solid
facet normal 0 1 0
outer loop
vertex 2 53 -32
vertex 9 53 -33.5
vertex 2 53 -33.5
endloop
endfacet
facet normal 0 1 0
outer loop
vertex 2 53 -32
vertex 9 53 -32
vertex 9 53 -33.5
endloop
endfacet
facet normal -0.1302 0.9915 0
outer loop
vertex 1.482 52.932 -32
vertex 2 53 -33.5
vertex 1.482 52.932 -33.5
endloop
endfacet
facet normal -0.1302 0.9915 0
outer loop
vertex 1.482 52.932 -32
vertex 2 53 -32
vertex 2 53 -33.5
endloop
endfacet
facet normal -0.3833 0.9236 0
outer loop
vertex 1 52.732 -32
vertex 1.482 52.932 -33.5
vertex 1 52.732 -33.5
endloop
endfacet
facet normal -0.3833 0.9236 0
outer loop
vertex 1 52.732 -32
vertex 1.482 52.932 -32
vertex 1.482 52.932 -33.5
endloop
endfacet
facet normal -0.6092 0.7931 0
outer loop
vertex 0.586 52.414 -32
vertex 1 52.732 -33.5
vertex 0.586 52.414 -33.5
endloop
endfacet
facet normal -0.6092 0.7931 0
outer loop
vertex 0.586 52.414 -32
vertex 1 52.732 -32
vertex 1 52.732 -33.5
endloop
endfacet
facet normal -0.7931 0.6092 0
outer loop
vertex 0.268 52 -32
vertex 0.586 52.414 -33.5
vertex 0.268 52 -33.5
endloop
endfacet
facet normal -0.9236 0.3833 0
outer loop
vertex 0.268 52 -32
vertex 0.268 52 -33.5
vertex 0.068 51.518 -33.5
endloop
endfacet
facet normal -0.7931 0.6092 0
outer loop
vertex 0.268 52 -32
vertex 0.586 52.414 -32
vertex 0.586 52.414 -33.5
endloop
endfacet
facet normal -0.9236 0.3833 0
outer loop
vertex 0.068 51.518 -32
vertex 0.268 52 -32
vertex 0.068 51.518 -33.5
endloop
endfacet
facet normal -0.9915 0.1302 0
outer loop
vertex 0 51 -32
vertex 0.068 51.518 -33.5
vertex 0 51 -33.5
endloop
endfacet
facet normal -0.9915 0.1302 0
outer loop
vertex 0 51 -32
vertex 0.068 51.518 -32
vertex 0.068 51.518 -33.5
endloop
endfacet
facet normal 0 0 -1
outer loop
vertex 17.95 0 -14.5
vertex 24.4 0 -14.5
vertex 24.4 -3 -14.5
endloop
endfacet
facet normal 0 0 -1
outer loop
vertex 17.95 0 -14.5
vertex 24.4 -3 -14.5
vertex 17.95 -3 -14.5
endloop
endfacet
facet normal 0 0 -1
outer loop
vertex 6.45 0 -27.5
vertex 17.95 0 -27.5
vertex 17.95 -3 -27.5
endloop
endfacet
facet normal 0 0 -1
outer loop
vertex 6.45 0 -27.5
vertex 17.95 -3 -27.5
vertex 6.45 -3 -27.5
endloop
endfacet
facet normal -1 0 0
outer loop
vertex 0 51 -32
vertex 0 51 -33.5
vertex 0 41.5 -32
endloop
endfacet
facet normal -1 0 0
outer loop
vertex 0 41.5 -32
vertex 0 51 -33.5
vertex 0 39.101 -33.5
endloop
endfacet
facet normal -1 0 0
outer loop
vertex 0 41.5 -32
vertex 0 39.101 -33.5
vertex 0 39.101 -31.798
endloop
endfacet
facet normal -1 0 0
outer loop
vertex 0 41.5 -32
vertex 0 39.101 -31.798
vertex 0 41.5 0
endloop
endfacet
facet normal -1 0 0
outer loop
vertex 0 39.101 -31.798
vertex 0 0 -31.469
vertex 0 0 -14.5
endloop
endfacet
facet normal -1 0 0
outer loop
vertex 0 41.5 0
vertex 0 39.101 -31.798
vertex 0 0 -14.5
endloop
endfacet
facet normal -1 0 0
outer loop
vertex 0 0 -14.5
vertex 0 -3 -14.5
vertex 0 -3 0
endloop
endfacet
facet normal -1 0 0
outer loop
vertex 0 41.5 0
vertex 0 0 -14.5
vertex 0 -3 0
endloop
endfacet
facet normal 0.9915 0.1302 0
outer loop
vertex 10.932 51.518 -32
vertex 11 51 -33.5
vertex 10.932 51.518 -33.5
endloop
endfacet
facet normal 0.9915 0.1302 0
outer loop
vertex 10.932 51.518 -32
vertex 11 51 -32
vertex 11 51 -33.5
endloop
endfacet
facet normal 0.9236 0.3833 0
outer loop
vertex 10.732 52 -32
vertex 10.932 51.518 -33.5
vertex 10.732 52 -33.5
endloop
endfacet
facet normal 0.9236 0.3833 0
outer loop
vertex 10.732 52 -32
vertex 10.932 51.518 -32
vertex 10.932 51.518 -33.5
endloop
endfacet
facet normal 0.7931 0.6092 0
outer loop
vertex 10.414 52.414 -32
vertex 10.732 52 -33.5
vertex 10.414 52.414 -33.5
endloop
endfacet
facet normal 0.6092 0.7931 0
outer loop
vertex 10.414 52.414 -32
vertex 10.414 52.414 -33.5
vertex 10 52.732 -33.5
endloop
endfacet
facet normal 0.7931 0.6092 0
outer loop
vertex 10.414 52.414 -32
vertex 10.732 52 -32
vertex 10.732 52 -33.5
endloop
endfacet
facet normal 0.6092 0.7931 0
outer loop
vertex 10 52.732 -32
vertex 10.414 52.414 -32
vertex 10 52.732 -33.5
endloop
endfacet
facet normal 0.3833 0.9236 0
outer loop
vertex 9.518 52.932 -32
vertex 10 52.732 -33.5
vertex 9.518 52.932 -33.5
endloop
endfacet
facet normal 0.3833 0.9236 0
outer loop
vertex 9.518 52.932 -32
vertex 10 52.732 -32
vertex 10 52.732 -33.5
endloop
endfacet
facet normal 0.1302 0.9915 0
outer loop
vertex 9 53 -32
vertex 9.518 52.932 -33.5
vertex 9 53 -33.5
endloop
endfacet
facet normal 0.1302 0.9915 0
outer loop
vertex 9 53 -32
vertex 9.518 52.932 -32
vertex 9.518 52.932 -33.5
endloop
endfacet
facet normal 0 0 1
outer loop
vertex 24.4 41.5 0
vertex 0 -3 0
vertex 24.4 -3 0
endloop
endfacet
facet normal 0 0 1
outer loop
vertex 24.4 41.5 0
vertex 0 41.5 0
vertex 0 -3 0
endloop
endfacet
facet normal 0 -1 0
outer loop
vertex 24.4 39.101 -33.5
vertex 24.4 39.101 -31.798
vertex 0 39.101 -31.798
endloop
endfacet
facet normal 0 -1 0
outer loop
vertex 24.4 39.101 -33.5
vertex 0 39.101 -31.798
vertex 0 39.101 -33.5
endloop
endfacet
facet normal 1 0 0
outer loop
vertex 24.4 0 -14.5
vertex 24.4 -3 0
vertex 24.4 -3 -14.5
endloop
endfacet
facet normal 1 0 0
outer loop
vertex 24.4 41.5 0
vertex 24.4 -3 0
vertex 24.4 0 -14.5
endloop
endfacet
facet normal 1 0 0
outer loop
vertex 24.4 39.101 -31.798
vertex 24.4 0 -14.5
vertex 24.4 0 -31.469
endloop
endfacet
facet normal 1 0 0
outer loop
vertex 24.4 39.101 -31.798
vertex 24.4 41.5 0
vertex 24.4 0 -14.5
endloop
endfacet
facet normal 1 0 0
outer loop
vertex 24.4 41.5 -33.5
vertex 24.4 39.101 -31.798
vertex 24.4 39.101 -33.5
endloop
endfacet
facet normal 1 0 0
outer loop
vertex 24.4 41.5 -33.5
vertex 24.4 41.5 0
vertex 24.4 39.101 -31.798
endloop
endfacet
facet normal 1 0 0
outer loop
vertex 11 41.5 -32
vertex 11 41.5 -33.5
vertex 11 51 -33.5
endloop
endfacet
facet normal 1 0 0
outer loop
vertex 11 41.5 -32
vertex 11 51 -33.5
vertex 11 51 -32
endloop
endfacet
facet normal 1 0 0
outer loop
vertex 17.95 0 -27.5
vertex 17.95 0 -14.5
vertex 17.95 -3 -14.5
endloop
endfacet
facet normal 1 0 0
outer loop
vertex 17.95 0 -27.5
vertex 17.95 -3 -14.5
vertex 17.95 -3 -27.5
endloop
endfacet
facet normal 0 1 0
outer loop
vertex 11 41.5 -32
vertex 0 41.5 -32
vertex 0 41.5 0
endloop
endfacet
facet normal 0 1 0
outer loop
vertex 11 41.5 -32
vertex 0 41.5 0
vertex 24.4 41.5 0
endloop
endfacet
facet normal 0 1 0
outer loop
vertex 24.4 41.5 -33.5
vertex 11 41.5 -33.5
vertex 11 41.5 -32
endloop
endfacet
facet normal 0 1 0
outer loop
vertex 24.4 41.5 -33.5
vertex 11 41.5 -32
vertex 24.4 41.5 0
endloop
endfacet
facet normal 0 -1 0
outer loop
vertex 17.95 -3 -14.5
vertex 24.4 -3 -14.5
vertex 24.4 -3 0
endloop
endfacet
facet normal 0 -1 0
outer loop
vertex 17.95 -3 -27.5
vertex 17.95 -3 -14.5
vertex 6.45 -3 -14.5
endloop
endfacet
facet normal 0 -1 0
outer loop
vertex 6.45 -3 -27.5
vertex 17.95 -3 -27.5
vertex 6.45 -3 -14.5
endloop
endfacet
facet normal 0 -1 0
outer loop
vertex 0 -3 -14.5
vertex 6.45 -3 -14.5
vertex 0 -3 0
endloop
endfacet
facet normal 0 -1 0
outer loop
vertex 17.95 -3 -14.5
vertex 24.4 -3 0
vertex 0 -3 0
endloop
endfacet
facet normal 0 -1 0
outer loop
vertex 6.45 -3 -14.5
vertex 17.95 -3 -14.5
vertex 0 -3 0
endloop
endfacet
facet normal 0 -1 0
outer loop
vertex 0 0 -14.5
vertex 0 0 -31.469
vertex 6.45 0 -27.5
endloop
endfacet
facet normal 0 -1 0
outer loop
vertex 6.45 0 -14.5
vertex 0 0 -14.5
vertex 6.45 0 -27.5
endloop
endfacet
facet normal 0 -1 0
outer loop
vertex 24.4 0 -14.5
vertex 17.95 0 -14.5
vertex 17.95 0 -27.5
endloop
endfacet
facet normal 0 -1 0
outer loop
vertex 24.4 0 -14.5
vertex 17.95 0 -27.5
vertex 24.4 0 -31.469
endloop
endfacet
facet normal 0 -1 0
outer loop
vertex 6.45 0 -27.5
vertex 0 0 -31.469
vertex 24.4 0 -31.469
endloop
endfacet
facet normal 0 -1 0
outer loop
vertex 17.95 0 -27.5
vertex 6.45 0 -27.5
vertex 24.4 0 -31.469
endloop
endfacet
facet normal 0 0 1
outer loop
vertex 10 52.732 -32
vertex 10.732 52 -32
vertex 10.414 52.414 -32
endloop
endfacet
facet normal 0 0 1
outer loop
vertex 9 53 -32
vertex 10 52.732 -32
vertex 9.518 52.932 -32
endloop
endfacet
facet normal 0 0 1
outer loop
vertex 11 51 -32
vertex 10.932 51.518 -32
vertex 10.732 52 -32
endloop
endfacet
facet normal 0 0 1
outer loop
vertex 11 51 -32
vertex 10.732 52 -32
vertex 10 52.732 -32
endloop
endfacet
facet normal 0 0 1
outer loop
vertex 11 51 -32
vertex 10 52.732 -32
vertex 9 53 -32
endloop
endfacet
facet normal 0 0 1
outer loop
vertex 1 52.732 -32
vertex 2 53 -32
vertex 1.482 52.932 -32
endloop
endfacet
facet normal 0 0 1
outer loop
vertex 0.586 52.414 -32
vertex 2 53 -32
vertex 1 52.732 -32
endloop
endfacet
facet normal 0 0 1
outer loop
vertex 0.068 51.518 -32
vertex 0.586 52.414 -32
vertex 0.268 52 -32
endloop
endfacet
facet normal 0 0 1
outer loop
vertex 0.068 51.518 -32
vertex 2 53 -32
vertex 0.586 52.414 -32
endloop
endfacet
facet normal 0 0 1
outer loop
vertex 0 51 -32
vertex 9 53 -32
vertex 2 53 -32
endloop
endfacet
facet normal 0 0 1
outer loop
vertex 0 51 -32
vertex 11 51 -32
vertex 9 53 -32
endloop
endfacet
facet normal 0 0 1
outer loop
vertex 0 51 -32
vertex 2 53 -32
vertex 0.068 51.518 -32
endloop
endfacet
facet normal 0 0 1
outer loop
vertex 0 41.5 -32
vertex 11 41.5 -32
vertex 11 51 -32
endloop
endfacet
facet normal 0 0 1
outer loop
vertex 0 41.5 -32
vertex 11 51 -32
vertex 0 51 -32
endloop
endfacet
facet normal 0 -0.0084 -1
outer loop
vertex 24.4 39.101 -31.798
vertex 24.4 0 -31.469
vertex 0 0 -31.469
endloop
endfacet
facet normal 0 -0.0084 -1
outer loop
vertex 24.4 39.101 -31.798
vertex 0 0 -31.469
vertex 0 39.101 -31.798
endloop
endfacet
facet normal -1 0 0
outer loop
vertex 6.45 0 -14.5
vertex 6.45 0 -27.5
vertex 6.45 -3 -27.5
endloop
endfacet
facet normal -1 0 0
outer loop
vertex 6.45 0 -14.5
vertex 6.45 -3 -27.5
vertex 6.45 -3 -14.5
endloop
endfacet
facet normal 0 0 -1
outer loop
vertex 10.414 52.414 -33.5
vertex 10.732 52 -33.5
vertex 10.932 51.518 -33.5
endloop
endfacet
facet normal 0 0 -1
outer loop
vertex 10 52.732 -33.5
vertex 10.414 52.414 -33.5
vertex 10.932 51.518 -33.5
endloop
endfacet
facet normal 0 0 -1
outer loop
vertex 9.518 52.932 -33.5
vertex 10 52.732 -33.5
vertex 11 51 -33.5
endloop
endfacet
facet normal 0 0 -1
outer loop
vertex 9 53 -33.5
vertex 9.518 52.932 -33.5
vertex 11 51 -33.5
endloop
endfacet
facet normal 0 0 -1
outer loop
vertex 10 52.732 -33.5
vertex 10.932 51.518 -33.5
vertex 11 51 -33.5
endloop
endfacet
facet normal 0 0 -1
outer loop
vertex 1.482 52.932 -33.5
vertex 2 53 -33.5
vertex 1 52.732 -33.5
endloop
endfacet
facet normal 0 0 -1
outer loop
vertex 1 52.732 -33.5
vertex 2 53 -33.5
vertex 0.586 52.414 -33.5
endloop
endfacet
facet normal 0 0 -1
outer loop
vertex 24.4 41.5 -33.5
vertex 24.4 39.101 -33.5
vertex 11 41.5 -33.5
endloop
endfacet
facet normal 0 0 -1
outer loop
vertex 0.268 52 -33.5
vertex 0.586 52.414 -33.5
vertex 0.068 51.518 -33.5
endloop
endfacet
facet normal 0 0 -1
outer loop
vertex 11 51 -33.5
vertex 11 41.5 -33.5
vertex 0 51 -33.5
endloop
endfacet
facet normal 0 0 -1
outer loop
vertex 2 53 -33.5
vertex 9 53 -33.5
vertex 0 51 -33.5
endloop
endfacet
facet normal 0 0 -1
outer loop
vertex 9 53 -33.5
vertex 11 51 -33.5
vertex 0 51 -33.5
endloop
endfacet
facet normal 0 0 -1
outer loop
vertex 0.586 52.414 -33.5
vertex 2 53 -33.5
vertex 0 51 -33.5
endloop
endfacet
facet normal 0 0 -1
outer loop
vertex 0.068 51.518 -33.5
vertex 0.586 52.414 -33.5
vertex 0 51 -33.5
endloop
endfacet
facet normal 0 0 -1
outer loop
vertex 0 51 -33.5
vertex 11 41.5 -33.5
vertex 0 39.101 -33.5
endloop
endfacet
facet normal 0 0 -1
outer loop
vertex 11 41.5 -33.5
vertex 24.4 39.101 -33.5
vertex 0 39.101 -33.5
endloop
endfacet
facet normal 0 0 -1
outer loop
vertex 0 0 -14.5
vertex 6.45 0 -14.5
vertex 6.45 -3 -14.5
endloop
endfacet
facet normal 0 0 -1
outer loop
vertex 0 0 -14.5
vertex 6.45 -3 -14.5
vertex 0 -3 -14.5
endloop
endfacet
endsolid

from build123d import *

# Parameters (mm, degrees)
SKETCH1_W           = 24.4
SKETCH1_H           = 33.5
BOSS_EXTRUDE1_DEPTH = 41.5
BOSS_EXTRUDE2_DEPTH = 3
SKETCH4_W           = 11
SKETCH4_H           = 1.5
BOSS_EXTRUDE3_DEPTH = 11.5
CUT_EXTRUDE1_DEPTH  = 25.4
FILLET1_R           = 2


with BuildPart() as part:
    # Sketch1 → Boss-Extrude1 (new body)
    with BuildSketch(Plane(origin=(0, 0, 0), x_dir=(1, 0, 0), z_dir=(0, 1, 0))):
        with Locations((12.2, 16.75)):
            Rectangle(SKETCH1_W, SKETCH1_H)
    extrude(amount=BOSS_EXTRUDE1_DEPTH)

    # Sketch3 → Boss-Extrude2 (add)
    with BuildSketch(Plane.XZ):
        Polygon((0, 0), (24.4, 0), (24.4, -14.5), (17.95, -14.5), (17.95, -27.5), (6.45, -27.5), (6.45, -14.5), (0, -14.5), align=None)
    extrude(amount=BOSS_EXTRUDE2_DEPTH)

    # Sketch4 → Boss-Extrude3 (add)
    with BuildSketch(Plane(origin=(0, 41.5, 0), x_dir=(-1, 0, 0), z_dir=(0, 1, 0))):
        with Locations((-5.5, -32.75)):
            Rectangle(SKETCH4_W, SKETCH4_H)
    extrude(amount=BOSS_EXTRUDE3_DEPTH)

    # Sketch5 → Cut-Extrude1 (cut, through all)
    with BuildSketch(Plane(origin=(24.4, 0, 0), x_dir=(0, 0, -1), z_dir=(1, 0, 0))):
        Polygon((33.5, 0), (31.46940795, 0), (31.797940048, 39.10064674), (33.5, 39.10064674), align=None)
    extrude(amount=-CUT_EXTRUDE1_DEPTH, mode=Mode.SUBTRACT)

    # Fillet1
    fillet1_edges = [part.edges().sort_by_distance(p)[0] for p in [
        (0, 53, -32.75),
        (11, 53, -32.75),
    ]]
    fillet(fillet1_edges, radius=FILLET1_R)


solid = part.part
